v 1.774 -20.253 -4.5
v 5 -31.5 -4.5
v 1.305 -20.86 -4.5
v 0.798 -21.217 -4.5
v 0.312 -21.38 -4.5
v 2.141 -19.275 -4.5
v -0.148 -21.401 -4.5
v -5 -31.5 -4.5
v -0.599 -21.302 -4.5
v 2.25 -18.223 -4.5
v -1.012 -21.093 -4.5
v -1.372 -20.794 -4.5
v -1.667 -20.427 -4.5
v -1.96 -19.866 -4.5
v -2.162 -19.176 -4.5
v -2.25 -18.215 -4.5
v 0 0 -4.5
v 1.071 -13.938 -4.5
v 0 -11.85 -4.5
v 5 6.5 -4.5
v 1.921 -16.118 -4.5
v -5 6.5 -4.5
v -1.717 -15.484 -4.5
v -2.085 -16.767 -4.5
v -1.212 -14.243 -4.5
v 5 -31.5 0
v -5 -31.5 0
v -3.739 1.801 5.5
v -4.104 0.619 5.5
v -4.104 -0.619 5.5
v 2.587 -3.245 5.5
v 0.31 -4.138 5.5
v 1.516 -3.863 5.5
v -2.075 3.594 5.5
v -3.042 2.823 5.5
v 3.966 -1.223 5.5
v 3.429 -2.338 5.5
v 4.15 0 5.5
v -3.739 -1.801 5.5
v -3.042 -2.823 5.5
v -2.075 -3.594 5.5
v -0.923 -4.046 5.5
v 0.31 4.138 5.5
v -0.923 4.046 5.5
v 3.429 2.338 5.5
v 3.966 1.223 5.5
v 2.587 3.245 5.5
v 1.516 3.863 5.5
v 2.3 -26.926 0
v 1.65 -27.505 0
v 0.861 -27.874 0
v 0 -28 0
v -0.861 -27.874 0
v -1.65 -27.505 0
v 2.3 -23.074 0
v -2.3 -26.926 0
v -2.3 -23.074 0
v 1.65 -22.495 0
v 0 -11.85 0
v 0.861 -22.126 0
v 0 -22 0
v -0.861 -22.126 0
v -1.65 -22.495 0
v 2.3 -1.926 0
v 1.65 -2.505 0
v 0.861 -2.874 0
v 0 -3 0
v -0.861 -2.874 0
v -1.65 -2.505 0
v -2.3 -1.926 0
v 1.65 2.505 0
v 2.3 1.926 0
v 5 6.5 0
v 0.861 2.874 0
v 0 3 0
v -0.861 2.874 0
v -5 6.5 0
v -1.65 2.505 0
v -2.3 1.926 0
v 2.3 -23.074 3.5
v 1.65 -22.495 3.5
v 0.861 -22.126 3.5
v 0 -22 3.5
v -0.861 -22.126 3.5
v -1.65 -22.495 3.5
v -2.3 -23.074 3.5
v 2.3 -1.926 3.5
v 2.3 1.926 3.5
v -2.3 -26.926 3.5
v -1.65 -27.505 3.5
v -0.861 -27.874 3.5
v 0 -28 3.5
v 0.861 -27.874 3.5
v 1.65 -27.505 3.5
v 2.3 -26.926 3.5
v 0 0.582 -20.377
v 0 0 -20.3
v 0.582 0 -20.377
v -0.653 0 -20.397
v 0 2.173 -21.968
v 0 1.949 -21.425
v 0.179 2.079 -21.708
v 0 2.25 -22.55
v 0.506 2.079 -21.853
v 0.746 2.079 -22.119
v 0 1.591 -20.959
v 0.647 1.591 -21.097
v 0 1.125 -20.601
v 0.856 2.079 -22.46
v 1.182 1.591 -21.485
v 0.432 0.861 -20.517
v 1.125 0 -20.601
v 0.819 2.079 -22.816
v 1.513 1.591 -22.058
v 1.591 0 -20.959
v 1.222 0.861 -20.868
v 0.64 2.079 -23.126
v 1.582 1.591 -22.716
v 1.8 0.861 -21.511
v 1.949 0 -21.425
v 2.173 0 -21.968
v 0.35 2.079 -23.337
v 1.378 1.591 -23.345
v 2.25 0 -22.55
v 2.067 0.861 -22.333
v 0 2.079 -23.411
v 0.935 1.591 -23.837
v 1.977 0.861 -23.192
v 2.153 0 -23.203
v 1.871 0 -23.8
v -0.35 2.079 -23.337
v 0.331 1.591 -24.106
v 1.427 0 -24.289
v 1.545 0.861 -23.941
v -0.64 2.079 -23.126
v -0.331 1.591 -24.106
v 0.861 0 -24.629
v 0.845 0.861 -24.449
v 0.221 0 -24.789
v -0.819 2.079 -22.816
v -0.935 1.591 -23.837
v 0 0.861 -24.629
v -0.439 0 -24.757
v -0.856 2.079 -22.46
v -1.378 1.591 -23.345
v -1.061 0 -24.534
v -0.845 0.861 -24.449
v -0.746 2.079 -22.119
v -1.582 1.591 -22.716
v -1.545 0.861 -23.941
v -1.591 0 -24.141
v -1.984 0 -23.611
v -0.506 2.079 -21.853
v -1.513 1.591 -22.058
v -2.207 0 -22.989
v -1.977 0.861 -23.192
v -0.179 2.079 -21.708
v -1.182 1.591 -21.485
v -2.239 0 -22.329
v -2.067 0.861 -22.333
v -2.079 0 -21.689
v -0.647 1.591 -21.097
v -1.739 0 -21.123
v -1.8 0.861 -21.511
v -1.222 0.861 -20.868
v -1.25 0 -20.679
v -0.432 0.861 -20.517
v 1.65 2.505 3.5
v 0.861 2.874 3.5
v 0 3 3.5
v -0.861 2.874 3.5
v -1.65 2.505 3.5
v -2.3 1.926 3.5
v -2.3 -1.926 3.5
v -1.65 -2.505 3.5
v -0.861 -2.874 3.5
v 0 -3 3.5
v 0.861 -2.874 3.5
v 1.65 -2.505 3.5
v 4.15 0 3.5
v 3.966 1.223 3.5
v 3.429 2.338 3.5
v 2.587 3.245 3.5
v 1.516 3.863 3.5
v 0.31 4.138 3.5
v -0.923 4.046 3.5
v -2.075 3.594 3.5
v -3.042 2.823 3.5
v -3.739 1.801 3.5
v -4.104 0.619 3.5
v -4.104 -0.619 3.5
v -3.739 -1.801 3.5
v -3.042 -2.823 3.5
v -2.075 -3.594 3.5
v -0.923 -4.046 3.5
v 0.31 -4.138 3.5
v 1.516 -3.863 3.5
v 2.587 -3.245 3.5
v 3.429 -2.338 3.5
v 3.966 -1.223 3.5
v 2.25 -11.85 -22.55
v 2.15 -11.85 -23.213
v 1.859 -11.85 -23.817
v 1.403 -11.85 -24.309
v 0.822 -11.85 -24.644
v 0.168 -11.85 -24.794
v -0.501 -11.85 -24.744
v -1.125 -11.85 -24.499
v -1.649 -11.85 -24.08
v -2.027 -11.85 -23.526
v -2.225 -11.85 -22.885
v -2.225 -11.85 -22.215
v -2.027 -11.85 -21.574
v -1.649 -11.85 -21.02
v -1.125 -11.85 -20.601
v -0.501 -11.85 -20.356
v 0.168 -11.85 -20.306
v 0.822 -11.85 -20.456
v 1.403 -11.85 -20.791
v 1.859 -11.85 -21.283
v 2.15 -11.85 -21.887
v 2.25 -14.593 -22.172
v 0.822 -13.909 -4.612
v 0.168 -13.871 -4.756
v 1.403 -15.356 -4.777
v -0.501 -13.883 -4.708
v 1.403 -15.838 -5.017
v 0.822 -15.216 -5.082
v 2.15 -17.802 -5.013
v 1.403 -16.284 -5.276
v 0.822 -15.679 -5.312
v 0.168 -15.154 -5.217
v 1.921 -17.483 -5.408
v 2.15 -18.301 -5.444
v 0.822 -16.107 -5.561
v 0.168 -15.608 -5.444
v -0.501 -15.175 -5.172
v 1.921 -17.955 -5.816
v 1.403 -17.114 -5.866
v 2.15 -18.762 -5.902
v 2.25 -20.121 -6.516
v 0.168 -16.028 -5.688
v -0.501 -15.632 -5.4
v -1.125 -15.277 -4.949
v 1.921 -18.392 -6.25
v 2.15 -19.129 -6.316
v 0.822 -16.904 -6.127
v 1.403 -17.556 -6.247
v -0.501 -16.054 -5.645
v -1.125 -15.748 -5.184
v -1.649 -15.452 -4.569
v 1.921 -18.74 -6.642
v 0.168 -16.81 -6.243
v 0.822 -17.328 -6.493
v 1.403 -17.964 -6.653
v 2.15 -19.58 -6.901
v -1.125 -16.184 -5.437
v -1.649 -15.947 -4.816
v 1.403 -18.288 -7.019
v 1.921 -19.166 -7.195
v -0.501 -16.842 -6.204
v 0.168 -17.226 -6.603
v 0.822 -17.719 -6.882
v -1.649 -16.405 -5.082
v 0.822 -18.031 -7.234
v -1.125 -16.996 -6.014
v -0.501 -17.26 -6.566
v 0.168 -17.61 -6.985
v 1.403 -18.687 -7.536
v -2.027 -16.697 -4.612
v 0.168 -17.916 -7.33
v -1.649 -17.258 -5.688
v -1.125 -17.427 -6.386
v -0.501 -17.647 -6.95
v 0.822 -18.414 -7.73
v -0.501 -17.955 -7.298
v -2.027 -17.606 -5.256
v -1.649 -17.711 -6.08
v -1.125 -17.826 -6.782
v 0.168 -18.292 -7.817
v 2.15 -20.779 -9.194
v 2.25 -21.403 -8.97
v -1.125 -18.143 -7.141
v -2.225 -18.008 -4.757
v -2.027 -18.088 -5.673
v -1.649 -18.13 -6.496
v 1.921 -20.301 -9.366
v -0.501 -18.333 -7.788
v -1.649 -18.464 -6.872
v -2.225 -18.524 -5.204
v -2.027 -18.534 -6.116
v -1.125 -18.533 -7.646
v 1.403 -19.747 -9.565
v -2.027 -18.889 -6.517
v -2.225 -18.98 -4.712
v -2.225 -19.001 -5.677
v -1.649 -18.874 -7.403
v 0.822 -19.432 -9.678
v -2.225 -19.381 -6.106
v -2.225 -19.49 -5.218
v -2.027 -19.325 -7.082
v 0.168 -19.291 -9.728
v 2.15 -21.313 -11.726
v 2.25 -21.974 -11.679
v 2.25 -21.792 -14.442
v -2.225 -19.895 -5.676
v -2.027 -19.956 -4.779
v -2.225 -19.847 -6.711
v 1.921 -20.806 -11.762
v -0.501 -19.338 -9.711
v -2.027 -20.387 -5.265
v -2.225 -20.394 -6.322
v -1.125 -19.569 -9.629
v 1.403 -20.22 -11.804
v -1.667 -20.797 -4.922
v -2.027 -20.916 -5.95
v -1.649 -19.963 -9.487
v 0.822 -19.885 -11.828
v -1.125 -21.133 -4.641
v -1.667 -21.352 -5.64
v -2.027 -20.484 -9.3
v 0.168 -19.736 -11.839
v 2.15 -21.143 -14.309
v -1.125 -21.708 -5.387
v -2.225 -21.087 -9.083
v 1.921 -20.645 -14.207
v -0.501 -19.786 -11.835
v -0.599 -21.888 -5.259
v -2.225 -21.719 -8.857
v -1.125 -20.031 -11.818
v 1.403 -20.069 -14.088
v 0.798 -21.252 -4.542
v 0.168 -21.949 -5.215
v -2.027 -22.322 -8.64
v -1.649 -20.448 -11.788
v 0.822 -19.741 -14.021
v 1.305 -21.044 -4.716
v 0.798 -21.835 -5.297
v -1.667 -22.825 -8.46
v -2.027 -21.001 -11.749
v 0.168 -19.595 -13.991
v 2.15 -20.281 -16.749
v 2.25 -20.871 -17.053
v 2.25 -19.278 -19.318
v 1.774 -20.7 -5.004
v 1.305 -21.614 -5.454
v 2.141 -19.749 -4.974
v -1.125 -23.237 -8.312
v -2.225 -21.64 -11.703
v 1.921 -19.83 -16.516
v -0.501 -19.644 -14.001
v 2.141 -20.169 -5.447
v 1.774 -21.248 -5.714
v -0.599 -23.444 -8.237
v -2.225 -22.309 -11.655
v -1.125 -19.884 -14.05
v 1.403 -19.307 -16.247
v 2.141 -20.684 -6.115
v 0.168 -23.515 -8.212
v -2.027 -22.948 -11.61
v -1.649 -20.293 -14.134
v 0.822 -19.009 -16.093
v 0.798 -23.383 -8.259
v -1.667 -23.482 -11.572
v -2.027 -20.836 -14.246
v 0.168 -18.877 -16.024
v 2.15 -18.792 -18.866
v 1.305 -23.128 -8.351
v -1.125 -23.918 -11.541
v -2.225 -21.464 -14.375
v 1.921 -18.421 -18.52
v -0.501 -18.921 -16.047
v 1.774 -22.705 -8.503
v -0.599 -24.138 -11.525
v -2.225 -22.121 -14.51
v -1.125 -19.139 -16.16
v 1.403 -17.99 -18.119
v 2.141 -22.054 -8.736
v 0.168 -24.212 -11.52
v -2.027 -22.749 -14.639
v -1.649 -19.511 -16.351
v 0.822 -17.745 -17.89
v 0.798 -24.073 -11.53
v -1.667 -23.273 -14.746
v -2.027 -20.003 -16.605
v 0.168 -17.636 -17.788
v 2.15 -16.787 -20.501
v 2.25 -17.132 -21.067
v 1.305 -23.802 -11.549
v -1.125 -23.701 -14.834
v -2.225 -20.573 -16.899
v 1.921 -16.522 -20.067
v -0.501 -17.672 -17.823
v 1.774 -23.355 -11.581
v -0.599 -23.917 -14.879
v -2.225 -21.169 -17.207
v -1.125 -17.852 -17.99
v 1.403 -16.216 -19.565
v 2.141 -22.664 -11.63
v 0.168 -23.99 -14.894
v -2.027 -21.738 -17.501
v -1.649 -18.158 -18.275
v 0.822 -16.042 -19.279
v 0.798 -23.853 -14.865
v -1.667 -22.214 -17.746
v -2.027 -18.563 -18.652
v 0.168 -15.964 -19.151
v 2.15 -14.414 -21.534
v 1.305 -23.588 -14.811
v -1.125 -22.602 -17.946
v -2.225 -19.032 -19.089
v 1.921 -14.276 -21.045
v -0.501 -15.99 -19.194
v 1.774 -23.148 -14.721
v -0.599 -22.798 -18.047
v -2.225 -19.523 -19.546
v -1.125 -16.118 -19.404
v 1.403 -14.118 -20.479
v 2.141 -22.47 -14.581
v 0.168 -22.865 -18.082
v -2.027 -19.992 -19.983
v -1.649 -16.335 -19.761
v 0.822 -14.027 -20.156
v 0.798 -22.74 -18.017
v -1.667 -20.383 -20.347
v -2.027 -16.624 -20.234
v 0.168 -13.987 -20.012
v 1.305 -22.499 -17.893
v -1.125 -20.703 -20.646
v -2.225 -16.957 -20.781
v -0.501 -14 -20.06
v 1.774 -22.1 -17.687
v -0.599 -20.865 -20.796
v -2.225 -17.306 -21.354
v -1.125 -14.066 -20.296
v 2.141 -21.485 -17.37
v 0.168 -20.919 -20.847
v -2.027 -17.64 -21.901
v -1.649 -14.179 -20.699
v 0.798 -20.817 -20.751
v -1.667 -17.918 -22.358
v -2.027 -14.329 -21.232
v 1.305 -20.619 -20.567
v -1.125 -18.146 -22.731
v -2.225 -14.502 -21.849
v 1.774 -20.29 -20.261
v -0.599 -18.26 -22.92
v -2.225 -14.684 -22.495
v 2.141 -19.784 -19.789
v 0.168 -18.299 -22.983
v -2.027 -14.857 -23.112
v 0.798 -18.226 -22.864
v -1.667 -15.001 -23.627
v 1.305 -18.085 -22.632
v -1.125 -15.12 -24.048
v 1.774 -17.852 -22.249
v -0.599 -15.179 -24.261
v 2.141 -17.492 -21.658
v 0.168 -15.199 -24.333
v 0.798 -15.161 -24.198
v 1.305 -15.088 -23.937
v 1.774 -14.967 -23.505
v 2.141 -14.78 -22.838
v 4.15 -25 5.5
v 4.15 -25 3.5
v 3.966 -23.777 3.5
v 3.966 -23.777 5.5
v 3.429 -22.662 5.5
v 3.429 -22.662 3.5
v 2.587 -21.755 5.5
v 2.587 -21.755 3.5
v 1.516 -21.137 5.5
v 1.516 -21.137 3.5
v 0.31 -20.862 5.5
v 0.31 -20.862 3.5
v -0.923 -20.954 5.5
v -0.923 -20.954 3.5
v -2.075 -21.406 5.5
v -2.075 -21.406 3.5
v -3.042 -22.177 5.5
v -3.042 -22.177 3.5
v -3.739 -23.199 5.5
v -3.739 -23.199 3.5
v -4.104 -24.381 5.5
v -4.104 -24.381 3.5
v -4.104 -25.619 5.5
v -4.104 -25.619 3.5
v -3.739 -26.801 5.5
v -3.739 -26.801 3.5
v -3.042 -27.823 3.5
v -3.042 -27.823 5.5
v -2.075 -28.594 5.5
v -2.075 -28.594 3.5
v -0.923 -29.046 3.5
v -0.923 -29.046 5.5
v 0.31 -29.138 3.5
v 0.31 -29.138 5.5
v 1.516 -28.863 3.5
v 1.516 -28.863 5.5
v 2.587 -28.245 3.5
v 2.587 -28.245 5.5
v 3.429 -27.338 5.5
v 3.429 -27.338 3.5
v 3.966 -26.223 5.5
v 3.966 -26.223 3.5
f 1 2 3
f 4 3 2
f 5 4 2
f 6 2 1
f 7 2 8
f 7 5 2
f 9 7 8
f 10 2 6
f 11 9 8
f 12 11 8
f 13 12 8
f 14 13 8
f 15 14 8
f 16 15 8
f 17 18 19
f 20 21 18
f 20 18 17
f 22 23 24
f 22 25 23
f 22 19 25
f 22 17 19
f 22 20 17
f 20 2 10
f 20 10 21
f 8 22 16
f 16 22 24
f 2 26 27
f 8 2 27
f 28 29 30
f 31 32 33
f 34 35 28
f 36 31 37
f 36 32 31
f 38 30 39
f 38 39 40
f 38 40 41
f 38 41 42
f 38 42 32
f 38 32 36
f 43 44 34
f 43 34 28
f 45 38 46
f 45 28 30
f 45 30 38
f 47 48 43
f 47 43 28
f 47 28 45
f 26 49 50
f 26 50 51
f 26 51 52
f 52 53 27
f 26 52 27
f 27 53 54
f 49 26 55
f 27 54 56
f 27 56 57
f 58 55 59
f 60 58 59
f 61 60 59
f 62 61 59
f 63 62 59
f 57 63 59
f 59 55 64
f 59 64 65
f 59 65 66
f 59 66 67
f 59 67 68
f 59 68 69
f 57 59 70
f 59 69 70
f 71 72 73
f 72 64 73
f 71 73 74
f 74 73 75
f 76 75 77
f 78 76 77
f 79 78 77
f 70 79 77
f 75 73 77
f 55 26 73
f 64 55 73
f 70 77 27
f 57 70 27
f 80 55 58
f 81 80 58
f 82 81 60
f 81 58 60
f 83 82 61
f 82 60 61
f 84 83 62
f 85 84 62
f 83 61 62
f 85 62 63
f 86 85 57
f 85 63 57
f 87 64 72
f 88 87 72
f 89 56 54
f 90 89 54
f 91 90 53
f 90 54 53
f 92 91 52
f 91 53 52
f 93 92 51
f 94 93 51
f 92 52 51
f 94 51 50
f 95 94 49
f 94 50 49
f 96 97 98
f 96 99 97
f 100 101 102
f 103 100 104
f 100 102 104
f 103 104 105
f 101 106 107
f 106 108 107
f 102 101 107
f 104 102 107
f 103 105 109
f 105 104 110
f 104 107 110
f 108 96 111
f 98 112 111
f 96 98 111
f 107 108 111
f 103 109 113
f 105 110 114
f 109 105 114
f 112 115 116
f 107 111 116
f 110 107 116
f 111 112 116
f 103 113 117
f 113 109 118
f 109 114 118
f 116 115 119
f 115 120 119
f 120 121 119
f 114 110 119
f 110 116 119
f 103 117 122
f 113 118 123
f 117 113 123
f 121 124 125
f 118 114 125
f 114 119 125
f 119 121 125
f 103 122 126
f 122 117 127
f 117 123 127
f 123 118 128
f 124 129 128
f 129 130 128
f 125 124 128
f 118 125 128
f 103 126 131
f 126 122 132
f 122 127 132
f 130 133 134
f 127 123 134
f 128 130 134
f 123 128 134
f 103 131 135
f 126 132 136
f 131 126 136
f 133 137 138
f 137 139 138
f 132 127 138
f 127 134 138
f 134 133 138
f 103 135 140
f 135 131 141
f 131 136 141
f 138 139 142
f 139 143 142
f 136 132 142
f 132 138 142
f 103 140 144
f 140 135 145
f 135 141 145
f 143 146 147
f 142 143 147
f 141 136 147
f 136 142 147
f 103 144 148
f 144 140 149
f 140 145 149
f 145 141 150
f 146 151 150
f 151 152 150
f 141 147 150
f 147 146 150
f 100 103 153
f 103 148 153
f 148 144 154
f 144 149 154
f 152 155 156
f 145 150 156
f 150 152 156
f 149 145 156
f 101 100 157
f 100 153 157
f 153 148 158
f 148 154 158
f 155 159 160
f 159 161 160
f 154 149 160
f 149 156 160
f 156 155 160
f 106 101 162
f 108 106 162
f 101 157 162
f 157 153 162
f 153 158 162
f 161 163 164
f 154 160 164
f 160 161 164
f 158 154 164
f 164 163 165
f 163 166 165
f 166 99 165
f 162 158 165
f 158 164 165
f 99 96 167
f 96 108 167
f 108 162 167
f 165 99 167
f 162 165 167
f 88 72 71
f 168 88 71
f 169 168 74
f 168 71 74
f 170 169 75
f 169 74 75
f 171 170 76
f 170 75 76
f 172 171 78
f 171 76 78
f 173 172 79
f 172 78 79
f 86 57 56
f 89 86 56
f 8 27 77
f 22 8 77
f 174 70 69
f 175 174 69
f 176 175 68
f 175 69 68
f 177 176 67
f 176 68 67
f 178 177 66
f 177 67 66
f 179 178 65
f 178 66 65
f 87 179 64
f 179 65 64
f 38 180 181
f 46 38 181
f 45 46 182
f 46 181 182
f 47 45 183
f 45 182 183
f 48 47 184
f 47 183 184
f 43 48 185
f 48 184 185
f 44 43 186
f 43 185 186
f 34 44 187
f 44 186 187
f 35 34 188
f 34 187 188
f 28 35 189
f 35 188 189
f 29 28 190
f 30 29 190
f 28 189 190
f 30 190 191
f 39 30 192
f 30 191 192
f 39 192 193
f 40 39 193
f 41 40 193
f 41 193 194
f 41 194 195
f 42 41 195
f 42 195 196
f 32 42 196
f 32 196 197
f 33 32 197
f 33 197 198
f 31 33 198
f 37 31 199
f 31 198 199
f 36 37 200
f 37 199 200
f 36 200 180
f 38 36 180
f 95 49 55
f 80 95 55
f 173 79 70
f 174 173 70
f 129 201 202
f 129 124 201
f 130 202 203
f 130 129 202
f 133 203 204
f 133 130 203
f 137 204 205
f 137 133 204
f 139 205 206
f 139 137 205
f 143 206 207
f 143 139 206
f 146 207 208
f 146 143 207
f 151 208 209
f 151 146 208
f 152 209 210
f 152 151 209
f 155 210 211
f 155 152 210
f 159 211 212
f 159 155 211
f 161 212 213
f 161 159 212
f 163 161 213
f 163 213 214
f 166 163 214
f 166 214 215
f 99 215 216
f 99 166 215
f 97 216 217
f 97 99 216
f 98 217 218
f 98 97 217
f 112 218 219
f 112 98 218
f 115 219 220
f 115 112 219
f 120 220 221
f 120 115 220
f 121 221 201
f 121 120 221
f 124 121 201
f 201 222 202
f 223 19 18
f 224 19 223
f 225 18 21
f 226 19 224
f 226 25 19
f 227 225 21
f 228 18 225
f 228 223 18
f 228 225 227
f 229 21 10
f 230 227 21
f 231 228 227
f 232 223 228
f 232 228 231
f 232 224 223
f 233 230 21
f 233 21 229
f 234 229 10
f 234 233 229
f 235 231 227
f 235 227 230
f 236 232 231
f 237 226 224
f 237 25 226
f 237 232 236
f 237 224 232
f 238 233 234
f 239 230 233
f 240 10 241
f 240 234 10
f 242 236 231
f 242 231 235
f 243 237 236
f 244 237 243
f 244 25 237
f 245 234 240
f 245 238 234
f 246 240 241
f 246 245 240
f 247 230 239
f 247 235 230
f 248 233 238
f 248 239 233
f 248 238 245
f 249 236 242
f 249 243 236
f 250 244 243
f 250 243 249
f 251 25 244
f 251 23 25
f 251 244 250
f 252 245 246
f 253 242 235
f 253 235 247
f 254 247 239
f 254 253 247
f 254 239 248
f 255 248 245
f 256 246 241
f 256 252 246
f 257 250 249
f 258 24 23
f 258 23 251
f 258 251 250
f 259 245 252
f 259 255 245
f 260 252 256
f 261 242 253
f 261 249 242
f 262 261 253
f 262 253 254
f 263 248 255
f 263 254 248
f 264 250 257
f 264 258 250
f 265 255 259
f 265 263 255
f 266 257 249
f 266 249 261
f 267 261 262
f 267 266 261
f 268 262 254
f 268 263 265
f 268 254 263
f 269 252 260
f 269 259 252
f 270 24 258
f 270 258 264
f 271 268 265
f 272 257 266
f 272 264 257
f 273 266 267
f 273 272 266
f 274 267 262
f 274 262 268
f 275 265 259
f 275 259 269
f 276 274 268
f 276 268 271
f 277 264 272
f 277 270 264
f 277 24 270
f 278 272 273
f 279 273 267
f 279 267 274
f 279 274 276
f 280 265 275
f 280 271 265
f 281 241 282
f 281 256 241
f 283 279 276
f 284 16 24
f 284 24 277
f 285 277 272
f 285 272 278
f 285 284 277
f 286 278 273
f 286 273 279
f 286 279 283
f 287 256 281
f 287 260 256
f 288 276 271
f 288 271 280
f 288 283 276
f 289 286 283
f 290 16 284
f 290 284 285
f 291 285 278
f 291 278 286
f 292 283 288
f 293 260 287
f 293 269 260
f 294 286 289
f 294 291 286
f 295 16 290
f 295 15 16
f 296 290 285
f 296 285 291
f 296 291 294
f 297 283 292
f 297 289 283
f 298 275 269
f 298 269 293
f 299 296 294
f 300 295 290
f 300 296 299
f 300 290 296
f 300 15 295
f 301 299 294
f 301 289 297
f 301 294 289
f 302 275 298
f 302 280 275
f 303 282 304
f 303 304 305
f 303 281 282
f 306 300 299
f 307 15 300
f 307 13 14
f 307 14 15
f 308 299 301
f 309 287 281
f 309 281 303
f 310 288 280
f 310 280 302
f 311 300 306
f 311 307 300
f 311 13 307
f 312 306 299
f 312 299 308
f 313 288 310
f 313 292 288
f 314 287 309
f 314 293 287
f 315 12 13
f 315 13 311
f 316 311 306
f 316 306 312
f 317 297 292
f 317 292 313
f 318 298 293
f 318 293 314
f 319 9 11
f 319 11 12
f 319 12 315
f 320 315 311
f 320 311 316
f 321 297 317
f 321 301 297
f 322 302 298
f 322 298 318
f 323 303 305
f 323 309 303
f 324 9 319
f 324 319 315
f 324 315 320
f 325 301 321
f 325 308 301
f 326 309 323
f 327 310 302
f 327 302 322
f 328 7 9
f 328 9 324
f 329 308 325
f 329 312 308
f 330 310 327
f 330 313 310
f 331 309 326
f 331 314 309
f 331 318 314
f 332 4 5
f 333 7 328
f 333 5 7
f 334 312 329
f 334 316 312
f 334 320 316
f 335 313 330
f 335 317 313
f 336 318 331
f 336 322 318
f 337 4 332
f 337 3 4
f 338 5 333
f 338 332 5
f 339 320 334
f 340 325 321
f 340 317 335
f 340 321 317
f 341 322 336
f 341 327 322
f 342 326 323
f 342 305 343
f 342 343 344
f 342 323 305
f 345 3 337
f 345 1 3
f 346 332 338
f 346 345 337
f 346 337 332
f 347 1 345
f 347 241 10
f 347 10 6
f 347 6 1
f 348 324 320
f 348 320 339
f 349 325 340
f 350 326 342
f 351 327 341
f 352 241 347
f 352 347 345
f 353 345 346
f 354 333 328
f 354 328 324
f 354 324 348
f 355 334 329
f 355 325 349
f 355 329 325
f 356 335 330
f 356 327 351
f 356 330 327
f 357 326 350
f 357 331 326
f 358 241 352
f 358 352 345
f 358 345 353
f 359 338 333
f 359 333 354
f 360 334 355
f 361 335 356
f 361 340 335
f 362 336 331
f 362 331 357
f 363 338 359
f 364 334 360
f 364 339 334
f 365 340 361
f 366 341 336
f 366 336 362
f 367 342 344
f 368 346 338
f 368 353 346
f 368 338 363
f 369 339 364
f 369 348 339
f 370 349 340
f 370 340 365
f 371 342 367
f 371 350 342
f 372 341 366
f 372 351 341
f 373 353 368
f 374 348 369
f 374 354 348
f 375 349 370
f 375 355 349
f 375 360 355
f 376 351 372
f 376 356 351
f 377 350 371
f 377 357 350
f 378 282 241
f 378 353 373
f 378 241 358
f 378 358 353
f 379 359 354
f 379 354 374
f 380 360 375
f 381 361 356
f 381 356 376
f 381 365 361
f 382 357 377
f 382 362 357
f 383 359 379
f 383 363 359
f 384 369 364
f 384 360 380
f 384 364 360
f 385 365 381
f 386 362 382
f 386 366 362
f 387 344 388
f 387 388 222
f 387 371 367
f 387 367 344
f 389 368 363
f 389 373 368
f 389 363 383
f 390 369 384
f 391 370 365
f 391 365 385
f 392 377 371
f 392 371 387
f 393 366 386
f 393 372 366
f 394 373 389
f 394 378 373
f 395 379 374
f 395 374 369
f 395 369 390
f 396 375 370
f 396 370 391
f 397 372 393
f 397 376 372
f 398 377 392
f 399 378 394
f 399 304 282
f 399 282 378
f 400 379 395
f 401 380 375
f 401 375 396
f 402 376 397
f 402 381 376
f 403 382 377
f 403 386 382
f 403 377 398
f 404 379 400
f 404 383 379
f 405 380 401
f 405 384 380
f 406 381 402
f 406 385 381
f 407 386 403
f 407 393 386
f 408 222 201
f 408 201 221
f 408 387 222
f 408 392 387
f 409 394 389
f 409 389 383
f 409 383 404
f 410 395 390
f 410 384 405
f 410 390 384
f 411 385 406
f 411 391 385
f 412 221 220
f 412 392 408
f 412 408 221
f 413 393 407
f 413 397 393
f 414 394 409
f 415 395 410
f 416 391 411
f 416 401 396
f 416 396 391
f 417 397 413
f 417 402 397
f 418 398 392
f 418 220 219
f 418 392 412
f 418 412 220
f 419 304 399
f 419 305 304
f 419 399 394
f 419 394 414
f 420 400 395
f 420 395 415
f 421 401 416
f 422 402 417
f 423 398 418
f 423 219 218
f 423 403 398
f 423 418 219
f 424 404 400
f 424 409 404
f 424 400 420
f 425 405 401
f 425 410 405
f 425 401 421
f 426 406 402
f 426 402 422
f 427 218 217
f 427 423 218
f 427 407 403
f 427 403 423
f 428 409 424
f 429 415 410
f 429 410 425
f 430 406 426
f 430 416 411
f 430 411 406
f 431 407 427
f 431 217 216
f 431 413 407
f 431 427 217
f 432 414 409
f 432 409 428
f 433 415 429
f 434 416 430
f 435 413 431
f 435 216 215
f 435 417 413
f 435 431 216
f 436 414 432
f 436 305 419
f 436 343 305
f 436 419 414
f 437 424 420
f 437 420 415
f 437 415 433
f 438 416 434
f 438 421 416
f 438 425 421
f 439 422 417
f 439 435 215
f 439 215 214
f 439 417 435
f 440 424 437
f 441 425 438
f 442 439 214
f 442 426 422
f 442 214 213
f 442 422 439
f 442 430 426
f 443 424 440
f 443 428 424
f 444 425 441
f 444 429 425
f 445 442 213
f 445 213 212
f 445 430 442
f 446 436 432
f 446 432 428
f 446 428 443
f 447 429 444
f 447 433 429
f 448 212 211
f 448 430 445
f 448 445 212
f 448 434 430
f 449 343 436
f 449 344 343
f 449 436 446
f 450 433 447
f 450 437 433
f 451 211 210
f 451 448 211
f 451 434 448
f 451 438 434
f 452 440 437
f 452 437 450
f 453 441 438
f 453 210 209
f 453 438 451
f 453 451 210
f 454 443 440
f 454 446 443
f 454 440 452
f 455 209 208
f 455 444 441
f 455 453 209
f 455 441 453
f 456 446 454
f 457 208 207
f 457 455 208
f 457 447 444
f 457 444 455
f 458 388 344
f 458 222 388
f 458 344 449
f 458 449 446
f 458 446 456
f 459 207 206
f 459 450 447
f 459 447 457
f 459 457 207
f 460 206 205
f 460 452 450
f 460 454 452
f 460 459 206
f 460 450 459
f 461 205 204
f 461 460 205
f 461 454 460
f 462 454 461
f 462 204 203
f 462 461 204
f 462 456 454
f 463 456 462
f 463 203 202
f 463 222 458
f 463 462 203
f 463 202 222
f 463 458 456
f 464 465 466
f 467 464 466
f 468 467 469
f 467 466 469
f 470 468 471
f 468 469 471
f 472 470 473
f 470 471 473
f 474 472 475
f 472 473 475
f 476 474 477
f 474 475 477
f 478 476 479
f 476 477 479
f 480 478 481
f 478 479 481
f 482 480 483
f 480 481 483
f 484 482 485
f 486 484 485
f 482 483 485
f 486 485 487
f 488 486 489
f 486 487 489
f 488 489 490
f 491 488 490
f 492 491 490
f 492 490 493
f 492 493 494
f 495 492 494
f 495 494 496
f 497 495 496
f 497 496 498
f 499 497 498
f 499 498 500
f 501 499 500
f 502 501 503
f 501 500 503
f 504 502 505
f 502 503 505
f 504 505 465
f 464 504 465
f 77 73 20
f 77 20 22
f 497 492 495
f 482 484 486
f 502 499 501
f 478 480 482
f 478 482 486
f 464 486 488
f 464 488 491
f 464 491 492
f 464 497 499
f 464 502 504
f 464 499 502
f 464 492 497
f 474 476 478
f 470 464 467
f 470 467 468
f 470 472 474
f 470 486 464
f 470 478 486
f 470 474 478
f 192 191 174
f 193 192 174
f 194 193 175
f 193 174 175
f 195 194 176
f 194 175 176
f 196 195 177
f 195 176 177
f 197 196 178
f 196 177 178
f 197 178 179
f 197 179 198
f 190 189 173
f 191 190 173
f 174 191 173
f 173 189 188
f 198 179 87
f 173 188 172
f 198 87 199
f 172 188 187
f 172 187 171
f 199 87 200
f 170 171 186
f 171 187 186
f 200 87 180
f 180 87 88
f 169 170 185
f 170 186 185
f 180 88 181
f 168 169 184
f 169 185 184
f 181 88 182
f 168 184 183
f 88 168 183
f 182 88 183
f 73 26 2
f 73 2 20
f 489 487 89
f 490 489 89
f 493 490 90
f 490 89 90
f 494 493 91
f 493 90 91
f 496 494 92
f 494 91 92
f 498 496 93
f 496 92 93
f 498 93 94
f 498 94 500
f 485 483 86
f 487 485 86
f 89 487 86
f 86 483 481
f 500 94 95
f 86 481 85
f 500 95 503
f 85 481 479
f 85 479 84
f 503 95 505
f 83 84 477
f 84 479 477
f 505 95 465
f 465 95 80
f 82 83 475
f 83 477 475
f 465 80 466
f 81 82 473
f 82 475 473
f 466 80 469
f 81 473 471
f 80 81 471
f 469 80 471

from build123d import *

# Parameters (mm, degrees)
EXTRUDE_1_DEPTH   = 3.5
EXTRUDE_1_2_DEPTH = 3.5
SKETCH_2_R        = 4.15
EXTRUDE_2_DEPTH   = 2
SKETCH_3_W        = 10
SKETCH_3_H        = 38
EXTRUDE_3_DEPTH   = 4.5
SKETCH_5_R        = 2.25


with BuildPart() as part:
    # 草图1 → 凸台-拉伸1 (new body)
    with BuildSketch(Plane.XY):
        with BuildLine():
            Line((-2.3, 1.926136028), (-2.3, -1.926136028))
            ThreePointArc((-2.3, -1.926136028), (0, -3), (2.3, -1.926136028))
            Line((2.3, -1.926136028), (2.3, 1.926136028))
            ThreePointArc((2.3, 1.926136028), (0, 3), (-2.3, 1.926136028))
        make_face()
    extrude(amount=EXTRUDE_1_DEPTH)



with BuildPart() as body_2:
    # 草图1 → Extrude 1 2 (new body)
    with BuildSketch(Plane.XY):
        with BuildLine():
            Line((-2.3, -23.073863972), (-2.3, -26.926136028))
            ThreePointArc((-2.3, -26.926136028), (0, -28), (2.3, -26.926136028))
            Line((2.3, -26.926136028), (2.3, -23.073863972))
            ThreePointArc((2.3, -23.073863972), (0, -22), (-2.3, -23.073863972))
        make_face()
    extrude(amount=EXTRUDE_1_2_DEPTH)


with BuildPart() as part_1:
    add(part.part)

    add(body_2.part)  # 凸台-拉伸2 merges body 2
    # 草图2 → 凸台-拉伸2 (add)
    with BuildSketch(Plane.XY.offset(3.5)):
        Circle(SKETCH_2_R)
        with Locations((0, -25)):
            Circle(SKETCH_2_R)
    extrude(amount=EXTRUDE_2_DEPTH)

    # 草图3 → 凸台-拉伸3 (add)
    with BuildSketch(Plane(origin=(0, 0, 0), x_dir=(-1, 0, 0), z_dir=(0, 0, -1))):
        with Locations((0, -12.5)):
            Rectangle(SKETCH_3_W, SKETCH_3_H)
    extrude(amount=EXTRUDE_3_DEPTH)

    # 扫描1: sweep along a path in 草图4
    with BuildLine(Plane(origin=(0, 0, 0), x_dir=(0, 0, -1), z_dir=(1, 0, 0))) as sweep_1_path:
        Line((2.25, 0), (2.25, -11.85))
        ThreePointArc((2.25, -11.85), (12.4, -22), (22.55, -11.85))
        Line((22.55, -11.85), (22.55, 0))
    # 草图5 → 扫描1 (sweep)
    with BuildSketch(Plane(origin=(0, 0, 0), x_dir=(1, 0, 0), z_dir=(0, 1, 0))):
        with Locations((0, 22.55)):
            Circle(SKETCH_5_R)
    sweep(path=sweep_1_path.line)

    # 草图6 → 旋转1 (revolve)
    with BuildSketch(Plane(origin=(0, 0, 0), x_dir=(0, 0, -1), z_dir=(1, 0, 0))):
        with BuildLine():
            Line((22.55, 0), (22.55, 2.25))
            ThreePointArc((22.55, 2.25), (20.959009742, 1.590990258), (20.3, 0))
            Line((20.3, 0), (22.55, 0))
        make_face()
    revolve(axis=Axis((0, 0, -22.55), (0, 1, 0)))


solid = part_1.part
